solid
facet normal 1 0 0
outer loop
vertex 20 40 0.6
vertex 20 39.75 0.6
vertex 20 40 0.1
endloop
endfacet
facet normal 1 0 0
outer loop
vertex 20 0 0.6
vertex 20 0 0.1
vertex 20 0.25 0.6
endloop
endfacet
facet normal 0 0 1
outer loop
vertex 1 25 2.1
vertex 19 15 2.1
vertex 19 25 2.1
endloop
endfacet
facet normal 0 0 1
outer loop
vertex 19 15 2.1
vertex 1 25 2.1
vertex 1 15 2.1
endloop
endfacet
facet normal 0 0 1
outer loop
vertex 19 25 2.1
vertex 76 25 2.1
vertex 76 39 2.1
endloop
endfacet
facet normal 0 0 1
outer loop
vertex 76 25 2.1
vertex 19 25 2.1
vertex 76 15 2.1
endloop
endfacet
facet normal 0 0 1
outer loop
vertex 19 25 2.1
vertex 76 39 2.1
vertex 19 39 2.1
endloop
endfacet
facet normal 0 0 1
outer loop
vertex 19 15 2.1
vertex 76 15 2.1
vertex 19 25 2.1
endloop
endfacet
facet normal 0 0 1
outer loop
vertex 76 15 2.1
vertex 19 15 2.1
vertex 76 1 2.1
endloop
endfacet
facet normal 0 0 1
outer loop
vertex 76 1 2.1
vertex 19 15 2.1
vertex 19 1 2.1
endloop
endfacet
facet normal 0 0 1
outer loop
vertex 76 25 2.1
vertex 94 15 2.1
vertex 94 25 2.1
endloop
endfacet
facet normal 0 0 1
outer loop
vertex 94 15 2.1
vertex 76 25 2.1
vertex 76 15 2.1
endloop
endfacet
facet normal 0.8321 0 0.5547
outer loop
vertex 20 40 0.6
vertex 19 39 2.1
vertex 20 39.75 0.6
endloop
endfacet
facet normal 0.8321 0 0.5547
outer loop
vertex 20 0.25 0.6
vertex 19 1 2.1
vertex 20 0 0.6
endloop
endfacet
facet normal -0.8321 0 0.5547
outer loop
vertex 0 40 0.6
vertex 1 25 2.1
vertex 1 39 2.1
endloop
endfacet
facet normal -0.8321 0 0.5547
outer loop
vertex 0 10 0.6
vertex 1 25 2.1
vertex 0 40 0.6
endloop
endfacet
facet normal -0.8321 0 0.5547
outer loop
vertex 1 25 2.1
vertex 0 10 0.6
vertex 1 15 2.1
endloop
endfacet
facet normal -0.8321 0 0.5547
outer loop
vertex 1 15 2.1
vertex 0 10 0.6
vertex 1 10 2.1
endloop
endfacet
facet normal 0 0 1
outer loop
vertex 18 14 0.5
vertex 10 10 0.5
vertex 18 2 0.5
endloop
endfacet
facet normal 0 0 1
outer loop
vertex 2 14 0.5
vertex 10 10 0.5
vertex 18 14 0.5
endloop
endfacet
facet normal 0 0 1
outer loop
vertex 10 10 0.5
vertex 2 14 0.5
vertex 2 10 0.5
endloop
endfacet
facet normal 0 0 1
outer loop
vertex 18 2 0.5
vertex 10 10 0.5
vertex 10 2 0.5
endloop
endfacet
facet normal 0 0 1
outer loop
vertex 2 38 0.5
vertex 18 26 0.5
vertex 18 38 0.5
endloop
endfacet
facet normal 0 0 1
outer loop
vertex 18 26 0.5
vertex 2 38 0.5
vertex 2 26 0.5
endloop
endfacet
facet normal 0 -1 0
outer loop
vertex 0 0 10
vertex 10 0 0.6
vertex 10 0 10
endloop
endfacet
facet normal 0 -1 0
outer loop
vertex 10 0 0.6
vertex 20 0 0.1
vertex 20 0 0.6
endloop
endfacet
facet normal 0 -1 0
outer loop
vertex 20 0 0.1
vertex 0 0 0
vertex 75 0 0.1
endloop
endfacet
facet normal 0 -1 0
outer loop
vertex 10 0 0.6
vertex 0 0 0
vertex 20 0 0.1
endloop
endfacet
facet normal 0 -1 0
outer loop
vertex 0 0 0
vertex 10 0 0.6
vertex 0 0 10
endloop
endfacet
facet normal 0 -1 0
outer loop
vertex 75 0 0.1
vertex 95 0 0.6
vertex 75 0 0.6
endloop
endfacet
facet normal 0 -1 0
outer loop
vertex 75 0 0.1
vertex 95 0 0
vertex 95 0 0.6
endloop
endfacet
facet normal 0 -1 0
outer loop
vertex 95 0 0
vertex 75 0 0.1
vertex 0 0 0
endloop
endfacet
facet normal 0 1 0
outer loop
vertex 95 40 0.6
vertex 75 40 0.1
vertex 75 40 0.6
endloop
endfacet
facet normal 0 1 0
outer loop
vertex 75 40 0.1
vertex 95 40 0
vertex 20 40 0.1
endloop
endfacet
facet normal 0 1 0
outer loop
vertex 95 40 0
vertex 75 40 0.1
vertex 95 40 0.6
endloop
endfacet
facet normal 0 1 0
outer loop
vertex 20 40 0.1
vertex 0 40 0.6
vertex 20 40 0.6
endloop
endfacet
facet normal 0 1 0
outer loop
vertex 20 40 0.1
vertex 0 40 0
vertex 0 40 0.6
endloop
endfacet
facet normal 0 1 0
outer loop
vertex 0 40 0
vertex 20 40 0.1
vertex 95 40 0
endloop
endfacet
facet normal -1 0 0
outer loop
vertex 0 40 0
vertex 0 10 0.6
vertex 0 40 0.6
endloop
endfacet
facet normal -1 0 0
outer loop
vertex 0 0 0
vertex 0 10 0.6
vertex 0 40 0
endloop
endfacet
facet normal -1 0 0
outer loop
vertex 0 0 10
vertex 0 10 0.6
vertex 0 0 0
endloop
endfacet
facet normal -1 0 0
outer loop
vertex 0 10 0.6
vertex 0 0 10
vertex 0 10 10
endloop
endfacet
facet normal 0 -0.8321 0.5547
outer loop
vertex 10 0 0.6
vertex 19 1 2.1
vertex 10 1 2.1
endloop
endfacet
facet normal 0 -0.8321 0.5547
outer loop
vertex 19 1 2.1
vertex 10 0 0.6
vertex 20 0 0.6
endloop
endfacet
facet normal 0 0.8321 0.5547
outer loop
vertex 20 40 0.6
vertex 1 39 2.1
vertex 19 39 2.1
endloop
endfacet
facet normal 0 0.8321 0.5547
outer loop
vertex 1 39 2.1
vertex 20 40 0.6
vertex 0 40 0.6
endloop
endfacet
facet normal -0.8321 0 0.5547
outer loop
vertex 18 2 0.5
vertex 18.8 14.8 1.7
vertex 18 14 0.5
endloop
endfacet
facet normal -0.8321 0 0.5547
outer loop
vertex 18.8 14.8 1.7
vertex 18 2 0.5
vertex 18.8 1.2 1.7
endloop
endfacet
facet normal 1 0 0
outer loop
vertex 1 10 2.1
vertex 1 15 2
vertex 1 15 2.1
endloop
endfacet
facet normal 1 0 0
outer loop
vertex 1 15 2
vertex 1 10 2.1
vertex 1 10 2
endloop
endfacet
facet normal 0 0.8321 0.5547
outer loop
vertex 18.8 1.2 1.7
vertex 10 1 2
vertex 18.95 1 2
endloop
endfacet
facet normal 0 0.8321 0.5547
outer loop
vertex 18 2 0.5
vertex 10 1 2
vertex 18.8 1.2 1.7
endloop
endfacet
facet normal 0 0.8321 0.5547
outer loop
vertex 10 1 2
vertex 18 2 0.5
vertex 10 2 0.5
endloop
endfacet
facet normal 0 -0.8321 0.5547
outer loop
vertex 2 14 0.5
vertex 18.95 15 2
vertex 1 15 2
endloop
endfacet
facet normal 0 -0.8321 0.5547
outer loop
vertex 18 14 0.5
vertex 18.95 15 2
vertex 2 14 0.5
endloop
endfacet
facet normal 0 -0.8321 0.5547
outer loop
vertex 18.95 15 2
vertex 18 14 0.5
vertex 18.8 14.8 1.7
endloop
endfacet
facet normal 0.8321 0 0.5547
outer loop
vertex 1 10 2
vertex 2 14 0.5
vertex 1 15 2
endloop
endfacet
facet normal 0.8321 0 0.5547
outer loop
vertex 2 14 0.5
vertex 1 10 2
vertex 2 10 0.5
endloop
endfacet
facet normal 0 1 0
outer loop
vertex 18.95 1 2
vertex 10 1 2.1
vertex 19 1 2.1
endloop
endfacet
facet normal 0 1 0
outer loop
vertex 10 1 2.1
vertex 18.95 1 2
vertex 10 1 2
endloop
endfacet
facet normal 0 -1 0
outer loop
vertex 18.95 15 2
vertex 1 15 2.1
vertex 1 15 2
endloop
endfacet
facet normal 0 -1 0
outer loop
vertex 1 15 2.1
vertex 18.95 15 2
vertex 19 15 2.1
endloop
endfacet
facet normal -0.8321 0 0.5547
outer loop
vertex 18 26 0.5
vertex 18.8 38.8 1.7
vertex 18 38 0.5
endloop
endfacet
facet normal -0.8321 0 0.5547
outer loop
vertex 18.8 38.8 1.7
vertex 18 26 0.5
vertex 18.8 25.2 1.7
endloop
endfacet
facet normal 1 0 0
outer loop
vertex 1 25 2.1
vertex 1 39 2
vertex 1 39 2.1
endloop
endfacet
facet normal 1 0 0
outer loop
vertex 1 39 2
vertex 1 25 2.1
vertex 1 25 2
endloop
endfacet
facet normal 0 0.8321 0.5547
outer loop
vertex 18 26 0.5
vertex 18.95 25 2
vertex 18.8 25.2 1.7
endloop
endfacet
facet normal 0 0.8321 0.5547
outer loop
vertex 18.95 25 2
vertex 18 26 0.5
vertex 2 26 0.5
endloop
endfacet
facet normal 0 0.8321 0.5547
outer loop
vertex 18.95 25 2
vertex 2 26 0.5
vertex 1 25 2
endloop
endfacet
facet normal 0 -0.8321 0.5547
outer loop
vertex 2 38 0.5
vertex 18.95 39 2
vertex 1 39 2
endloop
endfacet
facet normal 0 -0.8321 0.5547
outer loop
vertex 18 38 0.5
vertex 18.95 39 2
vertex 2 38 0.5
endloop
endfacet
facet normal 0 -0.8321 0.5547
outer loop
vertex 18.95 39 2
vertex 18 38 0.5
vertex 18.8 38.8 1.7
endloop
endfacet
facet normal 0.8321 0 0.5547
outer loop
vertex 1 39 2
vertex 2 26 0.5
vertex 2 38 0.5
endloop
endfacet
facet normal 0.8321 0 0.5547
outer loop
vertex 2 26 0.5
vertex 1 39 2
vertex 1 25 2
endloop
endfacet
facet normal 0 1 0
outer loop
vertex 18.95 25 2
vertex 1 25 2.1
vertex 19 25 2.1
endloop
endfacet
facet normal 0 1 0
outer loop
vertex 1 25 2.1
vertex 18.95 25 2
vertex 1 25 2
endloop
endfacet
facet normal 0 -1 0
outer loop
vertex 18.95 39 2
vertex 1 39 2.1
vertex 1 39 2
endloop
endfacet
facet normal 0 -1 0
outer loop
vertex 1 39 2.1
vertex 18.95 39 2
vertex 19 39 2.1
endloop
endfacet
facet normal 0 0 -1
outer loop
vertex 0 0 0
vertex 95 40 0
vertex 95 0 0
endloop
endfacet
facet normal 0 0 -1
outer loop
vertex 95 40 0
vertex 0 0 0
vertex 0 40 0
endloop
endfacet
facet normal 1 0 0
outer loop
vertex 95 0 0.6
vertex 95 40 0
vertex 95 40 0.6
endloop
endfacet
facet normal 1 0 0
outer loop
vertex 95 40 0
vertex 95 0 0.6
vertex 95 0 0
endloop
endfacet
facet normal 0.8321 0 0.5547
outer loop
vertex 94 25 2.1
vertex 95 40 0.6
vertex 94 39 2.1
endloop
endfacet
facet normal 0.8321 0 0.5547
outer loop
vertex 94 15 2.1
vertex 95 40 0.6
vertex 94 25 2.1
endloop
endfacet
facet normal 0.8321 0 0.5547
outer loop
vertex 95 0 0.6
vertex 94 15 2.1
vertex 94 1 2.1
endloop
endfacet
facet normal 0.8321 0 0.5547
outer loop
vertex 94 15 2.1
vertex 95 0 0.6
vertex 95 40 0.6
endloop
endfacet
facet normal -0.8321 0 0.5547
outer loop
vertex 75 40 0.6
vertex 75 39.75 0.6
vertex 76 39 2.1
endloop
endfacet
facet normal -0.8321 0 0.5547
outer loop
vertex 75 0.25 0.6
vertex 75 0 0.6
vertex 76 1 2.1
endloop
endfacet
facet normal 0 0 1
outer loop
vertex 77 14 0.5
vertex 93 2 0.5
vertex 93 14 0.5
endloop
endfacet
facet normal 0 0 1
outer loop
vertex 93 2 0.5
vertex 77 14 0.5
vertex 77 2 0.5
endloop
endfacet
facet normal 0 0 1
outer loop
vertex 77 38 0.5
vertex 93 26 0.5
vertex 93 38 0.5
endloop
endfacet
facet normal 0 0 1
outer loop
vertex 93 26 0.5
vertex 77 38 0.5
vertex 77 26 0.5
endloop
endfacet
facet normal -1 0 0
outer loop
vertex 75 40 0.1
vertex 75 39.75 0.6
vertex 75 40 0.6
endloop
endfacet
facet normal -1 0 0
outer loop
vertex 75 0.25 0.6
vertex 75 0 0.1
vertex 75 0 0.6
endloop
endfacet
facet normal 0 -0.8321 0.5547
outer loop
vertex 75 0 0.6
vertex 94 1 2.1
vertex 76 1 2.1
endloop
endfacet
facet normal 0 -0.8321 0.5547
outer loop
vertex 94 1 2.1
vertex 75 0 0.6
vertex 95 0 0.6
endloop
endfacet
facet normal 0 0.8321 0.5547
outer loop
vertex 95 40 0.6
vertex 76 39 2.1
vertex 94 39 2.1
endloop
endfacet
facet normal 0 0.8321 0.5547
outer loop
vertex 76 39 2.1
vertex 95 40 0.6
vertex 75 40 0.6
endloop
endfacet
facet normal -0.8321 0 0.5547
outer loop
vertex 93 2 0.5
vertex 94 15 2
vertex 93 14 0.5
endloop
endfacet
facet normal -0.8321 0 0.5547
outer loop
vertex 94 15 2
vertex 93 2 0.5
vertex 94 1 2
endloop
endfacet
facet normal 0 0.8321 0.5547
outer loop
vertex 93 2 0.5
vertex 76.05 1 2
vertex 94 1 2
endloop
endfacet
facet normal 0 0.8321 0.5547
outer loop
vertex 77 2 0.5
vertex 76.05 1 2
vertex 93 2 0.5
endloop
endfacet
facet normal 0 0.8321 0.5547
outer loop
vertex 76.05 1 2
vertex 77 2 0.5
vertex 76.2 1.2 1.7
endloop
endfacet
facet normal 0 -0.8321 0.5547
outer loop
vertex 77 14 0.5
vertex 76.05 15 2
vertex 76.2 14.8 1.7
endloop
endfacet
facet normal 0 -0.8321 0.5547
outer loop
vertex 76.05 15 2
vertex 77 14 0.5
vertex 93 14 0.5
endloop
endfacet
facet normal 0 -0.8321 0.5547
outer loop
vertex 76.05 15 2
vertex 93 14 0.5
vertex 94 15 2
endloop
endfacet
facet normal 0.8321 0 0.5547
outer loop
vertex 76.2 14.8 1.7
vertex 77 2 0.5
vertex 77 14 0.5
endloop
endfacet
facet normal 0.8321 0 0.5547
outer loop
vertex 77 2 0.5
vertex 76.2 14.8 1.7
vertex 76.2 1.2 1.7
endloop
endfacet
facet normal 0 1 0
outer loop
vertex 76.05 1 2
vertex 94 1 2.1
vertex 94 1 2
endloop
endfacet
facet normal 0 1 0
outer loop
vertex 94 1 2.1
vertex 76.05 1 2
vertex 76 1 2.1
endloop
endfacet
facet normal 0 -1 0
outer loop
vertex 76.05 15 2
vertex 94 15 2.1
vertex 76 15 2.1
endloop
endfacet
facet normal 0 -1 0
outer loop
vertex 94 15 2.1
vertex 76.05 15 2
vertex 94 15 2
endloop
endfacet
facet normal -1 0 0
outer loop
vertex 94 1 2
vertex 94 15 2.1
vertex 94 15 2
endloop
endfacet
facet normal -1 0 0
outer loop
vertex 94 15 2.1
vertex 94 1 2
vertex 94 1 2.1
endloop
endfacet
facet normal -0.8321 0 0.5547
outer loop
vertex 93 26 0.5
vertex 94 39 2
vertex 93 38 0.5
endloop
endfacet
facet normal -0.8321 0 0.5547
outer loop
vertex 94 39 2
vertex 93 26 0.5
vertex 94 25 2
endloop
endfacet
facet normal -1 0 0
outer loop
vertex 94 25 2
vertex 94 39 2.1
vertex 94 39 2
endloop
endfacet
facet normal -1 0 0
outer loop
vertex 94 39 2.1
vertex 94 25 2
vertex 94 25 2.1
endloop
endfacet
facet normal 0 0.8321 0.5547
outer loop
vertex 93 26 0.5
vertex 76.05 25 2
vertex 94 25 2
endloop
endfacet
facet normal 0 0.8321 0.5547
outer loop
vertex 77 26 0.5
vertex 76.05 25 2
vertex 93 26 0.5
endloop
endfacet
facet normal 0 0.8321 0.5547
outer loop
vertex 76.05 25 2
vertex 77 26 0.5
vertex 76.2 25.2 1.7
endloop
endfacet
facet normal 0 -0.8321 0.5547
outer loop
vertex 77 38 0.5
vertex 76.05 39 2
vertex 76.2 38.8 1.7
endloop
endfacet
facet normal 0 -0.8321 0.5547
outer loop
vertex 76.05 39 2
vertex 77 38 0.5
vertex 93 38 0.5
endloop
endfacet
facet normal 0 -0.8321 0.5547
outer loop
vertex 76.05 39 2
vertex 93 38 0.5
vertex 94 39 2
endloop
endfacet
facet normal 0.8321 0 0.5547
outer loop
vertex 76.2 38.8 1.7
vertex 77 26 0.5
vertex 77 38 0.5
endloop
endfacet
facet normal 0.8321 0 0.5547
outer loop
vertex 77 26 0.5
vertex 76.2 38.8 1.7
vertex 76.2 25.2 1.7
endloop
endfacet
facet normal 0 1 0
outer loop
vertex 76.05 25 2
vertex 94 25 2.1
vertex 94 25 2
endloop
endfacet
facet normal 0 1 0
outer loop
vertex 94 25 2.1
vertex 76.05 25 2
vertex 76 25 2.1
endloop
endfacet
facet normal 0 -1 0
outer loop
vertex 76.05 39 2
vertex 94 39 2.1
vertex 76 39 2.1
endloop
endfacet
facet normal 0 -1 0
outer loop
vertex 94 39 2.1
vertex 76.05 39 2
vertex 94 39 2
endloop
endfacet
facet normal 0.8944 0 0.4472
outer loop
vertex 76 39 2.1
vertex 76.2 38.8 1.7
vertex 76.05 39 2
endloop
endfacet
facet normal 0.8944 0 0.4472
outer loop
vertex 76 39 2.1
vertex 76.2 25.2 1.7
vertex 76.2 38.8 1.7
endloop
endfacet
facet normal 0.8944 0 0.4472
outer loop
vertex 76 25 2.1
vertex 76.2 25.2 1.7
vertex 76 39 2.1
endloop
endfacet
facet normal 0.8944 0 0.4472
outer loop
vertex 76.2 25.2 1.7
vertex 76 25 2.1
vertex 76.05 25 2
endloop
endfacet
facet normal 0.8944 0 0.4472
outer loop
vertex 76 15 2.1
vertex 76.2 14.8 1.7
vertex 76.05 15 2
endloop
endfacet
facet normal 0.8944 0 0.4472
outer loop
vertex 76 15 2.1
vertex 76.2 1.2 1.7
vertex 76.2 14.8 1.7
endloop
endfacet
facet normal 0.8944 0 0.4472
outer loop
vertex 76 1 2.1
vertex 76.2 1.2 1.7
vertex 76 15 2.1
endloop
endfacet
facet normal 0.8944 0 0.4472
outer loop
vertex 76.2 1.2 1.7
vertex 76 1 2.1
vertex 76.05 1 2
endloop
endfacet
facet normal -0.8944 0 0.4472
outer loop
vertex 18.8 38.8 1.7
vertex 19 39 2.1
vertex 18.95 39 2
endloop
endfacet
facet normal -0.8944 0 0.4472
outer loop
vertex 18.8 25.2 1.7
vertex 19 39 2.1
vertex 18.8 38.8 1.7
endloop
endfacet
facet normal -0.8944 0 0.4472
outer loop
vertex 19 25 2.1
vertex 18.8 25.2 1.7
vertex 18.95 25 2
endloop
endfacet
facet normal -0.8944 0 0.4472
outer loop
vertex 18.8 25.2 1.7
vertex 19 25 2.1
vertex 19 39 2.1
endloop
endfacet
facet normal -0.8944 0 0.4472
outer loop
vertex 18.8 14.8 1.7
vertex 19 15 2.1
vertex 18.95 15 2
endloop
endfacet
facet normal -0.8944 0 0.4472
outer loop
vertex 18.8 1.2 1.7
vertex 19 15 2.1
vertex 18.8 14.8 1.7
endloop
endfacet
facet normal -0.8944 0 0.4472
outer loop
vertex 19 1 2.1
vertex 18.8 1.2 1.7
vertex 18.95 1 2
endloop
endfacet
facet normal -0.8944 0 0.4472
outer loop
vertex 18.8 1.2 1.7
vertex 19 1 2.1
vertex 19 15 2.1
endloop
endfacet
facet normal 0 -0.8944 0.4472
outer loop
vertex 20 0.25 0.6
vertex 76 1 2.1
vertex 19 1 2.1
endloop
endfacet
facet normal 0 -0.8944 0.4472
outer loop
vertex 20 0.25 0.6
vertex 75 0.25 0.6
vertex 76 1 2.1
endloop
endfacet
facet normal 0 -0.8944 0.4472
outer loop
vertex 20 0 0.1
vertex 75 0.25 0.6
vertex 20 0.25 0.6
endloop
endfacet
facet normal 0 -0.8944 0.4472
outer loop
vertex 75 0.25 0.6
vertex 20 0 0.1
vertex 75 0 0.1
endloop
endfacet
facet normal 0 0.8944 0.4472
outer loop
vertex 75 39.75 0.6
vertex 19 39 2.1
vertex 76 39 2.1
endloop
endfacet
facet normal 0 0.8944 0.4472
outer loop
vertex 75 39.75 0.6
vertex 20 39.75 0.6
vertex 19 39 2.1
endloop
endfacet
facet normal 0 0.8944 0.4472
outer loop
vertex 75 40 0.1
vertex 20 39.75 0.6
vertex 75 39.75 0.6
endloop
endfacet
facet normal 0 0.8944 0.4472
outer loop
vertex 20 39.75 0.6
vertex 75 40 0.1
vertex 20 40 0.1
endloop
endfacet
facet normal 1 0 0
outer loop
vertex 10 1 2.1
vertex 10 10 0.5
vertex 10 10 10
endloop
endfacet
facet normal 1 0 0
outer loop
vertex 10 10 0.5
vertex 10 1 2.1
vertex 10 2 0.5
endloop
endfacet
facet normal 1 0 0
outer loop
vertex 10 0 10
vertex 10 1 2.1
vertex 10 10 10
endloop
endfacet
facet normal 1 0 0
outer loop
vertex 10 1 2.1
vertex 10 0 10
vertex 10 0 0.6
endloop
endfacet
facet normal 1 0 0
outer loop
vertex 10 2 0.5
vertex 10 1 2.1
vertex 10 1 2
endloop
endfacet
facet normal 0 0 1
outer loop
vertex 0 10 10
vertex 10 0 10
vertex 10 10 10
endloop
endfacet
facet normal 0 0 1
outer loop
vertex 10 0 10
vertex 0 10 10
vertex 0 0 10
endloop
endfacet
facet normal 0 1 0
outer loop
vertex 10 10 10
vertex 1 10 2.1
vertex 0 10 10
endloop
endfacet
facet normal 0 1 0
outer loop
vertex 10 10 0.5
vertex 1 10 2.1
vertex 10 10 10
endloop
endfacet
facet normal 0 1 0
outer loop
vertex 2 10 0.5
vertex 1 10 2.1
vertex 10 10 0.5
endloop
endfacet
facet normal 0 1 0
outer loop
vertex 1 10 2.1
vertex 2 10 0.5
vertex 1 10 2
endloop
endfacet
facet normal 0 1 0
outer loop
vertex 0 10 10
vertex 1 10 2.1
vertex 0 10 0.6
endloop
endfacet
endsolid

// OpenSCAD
echo(version=version());
// Base Config
base_W = 20; // Min Size < 10
base_H = 40; // Min Size < 40
base_T = 0.5; // Fix Size = 0.5 for Stapler
default_S = 12; // Fix Size = 12 for Stapler (Stapler size)
default_T = 2.0; // Fix Size = 2.0 for Stapler (base_T < default_T)
$fn = 60;

staple_base(base_T,base_W,base_H,default_S,default_T);
translate([75, 0, 0]) staple_base(base_T,base_W,base_H,default_S,default_T);

translate([18, 0, 0]) hull() {
    translate([1, 1, 2]) cube([59 - 2, 40 - 2, 0.1]);
    translate([0, 0, 0]) cube([59, 40, 0.1]);
}


cube(size=[10, 10, 10], center=false);






* translate([10, 20, 6]) {
    cylinder(h=2, r1=1.2, r2=2.8, center=true, $fn=20);
    translate([0, 0, -3]) cylinder(h=5, r=1.2, center=true, $fn=20);
    translate([75, 0, 0]) {
        cylinder(h=2, r1=1.2, r2=2.8, center=true, $fn=20);
        translate([0, 0, -3]) cylinder(h=5, r=1.2, center=true, $fn=20);
    }
}

module stapler_area(bt,bw,ds,dt) {
    hull() {
        translate([0, 0, dt - bt]) cube([bw - dt, ds + 2, 0.1]);
        translate([1, 1, 0]) cube([bw - dt * 2, ds, 0.1]);
    }
}

module staple_base(bt,bw,bh,ds,dt) {
    union() {
        // Base1(Bottom)
        cube([bw, bh, bt]);
        // Base2(Top)
        translate([0, 0, bt]) {
            difference() {
                // Base2_body
                hull() {
                    translate([1, 1, dt - bt]) cube([bw - 2, bh - 2, 0.1]);
                    translate([0, 0, 0]) cube([bw, bh, 0.1]);
                }
                // Base2_stapler_area1(Top)
                # translate([dt - 1, dt - 1, 0]) stapler_area(bt,bw,ds,dt);
                // Base2_stapler_area2(Bottom)
                # translate([dt - 1, bh - ds - dt - 1, 0]) stapler_area(bt,bw,ds,dt);
            }
        }
    }
}
